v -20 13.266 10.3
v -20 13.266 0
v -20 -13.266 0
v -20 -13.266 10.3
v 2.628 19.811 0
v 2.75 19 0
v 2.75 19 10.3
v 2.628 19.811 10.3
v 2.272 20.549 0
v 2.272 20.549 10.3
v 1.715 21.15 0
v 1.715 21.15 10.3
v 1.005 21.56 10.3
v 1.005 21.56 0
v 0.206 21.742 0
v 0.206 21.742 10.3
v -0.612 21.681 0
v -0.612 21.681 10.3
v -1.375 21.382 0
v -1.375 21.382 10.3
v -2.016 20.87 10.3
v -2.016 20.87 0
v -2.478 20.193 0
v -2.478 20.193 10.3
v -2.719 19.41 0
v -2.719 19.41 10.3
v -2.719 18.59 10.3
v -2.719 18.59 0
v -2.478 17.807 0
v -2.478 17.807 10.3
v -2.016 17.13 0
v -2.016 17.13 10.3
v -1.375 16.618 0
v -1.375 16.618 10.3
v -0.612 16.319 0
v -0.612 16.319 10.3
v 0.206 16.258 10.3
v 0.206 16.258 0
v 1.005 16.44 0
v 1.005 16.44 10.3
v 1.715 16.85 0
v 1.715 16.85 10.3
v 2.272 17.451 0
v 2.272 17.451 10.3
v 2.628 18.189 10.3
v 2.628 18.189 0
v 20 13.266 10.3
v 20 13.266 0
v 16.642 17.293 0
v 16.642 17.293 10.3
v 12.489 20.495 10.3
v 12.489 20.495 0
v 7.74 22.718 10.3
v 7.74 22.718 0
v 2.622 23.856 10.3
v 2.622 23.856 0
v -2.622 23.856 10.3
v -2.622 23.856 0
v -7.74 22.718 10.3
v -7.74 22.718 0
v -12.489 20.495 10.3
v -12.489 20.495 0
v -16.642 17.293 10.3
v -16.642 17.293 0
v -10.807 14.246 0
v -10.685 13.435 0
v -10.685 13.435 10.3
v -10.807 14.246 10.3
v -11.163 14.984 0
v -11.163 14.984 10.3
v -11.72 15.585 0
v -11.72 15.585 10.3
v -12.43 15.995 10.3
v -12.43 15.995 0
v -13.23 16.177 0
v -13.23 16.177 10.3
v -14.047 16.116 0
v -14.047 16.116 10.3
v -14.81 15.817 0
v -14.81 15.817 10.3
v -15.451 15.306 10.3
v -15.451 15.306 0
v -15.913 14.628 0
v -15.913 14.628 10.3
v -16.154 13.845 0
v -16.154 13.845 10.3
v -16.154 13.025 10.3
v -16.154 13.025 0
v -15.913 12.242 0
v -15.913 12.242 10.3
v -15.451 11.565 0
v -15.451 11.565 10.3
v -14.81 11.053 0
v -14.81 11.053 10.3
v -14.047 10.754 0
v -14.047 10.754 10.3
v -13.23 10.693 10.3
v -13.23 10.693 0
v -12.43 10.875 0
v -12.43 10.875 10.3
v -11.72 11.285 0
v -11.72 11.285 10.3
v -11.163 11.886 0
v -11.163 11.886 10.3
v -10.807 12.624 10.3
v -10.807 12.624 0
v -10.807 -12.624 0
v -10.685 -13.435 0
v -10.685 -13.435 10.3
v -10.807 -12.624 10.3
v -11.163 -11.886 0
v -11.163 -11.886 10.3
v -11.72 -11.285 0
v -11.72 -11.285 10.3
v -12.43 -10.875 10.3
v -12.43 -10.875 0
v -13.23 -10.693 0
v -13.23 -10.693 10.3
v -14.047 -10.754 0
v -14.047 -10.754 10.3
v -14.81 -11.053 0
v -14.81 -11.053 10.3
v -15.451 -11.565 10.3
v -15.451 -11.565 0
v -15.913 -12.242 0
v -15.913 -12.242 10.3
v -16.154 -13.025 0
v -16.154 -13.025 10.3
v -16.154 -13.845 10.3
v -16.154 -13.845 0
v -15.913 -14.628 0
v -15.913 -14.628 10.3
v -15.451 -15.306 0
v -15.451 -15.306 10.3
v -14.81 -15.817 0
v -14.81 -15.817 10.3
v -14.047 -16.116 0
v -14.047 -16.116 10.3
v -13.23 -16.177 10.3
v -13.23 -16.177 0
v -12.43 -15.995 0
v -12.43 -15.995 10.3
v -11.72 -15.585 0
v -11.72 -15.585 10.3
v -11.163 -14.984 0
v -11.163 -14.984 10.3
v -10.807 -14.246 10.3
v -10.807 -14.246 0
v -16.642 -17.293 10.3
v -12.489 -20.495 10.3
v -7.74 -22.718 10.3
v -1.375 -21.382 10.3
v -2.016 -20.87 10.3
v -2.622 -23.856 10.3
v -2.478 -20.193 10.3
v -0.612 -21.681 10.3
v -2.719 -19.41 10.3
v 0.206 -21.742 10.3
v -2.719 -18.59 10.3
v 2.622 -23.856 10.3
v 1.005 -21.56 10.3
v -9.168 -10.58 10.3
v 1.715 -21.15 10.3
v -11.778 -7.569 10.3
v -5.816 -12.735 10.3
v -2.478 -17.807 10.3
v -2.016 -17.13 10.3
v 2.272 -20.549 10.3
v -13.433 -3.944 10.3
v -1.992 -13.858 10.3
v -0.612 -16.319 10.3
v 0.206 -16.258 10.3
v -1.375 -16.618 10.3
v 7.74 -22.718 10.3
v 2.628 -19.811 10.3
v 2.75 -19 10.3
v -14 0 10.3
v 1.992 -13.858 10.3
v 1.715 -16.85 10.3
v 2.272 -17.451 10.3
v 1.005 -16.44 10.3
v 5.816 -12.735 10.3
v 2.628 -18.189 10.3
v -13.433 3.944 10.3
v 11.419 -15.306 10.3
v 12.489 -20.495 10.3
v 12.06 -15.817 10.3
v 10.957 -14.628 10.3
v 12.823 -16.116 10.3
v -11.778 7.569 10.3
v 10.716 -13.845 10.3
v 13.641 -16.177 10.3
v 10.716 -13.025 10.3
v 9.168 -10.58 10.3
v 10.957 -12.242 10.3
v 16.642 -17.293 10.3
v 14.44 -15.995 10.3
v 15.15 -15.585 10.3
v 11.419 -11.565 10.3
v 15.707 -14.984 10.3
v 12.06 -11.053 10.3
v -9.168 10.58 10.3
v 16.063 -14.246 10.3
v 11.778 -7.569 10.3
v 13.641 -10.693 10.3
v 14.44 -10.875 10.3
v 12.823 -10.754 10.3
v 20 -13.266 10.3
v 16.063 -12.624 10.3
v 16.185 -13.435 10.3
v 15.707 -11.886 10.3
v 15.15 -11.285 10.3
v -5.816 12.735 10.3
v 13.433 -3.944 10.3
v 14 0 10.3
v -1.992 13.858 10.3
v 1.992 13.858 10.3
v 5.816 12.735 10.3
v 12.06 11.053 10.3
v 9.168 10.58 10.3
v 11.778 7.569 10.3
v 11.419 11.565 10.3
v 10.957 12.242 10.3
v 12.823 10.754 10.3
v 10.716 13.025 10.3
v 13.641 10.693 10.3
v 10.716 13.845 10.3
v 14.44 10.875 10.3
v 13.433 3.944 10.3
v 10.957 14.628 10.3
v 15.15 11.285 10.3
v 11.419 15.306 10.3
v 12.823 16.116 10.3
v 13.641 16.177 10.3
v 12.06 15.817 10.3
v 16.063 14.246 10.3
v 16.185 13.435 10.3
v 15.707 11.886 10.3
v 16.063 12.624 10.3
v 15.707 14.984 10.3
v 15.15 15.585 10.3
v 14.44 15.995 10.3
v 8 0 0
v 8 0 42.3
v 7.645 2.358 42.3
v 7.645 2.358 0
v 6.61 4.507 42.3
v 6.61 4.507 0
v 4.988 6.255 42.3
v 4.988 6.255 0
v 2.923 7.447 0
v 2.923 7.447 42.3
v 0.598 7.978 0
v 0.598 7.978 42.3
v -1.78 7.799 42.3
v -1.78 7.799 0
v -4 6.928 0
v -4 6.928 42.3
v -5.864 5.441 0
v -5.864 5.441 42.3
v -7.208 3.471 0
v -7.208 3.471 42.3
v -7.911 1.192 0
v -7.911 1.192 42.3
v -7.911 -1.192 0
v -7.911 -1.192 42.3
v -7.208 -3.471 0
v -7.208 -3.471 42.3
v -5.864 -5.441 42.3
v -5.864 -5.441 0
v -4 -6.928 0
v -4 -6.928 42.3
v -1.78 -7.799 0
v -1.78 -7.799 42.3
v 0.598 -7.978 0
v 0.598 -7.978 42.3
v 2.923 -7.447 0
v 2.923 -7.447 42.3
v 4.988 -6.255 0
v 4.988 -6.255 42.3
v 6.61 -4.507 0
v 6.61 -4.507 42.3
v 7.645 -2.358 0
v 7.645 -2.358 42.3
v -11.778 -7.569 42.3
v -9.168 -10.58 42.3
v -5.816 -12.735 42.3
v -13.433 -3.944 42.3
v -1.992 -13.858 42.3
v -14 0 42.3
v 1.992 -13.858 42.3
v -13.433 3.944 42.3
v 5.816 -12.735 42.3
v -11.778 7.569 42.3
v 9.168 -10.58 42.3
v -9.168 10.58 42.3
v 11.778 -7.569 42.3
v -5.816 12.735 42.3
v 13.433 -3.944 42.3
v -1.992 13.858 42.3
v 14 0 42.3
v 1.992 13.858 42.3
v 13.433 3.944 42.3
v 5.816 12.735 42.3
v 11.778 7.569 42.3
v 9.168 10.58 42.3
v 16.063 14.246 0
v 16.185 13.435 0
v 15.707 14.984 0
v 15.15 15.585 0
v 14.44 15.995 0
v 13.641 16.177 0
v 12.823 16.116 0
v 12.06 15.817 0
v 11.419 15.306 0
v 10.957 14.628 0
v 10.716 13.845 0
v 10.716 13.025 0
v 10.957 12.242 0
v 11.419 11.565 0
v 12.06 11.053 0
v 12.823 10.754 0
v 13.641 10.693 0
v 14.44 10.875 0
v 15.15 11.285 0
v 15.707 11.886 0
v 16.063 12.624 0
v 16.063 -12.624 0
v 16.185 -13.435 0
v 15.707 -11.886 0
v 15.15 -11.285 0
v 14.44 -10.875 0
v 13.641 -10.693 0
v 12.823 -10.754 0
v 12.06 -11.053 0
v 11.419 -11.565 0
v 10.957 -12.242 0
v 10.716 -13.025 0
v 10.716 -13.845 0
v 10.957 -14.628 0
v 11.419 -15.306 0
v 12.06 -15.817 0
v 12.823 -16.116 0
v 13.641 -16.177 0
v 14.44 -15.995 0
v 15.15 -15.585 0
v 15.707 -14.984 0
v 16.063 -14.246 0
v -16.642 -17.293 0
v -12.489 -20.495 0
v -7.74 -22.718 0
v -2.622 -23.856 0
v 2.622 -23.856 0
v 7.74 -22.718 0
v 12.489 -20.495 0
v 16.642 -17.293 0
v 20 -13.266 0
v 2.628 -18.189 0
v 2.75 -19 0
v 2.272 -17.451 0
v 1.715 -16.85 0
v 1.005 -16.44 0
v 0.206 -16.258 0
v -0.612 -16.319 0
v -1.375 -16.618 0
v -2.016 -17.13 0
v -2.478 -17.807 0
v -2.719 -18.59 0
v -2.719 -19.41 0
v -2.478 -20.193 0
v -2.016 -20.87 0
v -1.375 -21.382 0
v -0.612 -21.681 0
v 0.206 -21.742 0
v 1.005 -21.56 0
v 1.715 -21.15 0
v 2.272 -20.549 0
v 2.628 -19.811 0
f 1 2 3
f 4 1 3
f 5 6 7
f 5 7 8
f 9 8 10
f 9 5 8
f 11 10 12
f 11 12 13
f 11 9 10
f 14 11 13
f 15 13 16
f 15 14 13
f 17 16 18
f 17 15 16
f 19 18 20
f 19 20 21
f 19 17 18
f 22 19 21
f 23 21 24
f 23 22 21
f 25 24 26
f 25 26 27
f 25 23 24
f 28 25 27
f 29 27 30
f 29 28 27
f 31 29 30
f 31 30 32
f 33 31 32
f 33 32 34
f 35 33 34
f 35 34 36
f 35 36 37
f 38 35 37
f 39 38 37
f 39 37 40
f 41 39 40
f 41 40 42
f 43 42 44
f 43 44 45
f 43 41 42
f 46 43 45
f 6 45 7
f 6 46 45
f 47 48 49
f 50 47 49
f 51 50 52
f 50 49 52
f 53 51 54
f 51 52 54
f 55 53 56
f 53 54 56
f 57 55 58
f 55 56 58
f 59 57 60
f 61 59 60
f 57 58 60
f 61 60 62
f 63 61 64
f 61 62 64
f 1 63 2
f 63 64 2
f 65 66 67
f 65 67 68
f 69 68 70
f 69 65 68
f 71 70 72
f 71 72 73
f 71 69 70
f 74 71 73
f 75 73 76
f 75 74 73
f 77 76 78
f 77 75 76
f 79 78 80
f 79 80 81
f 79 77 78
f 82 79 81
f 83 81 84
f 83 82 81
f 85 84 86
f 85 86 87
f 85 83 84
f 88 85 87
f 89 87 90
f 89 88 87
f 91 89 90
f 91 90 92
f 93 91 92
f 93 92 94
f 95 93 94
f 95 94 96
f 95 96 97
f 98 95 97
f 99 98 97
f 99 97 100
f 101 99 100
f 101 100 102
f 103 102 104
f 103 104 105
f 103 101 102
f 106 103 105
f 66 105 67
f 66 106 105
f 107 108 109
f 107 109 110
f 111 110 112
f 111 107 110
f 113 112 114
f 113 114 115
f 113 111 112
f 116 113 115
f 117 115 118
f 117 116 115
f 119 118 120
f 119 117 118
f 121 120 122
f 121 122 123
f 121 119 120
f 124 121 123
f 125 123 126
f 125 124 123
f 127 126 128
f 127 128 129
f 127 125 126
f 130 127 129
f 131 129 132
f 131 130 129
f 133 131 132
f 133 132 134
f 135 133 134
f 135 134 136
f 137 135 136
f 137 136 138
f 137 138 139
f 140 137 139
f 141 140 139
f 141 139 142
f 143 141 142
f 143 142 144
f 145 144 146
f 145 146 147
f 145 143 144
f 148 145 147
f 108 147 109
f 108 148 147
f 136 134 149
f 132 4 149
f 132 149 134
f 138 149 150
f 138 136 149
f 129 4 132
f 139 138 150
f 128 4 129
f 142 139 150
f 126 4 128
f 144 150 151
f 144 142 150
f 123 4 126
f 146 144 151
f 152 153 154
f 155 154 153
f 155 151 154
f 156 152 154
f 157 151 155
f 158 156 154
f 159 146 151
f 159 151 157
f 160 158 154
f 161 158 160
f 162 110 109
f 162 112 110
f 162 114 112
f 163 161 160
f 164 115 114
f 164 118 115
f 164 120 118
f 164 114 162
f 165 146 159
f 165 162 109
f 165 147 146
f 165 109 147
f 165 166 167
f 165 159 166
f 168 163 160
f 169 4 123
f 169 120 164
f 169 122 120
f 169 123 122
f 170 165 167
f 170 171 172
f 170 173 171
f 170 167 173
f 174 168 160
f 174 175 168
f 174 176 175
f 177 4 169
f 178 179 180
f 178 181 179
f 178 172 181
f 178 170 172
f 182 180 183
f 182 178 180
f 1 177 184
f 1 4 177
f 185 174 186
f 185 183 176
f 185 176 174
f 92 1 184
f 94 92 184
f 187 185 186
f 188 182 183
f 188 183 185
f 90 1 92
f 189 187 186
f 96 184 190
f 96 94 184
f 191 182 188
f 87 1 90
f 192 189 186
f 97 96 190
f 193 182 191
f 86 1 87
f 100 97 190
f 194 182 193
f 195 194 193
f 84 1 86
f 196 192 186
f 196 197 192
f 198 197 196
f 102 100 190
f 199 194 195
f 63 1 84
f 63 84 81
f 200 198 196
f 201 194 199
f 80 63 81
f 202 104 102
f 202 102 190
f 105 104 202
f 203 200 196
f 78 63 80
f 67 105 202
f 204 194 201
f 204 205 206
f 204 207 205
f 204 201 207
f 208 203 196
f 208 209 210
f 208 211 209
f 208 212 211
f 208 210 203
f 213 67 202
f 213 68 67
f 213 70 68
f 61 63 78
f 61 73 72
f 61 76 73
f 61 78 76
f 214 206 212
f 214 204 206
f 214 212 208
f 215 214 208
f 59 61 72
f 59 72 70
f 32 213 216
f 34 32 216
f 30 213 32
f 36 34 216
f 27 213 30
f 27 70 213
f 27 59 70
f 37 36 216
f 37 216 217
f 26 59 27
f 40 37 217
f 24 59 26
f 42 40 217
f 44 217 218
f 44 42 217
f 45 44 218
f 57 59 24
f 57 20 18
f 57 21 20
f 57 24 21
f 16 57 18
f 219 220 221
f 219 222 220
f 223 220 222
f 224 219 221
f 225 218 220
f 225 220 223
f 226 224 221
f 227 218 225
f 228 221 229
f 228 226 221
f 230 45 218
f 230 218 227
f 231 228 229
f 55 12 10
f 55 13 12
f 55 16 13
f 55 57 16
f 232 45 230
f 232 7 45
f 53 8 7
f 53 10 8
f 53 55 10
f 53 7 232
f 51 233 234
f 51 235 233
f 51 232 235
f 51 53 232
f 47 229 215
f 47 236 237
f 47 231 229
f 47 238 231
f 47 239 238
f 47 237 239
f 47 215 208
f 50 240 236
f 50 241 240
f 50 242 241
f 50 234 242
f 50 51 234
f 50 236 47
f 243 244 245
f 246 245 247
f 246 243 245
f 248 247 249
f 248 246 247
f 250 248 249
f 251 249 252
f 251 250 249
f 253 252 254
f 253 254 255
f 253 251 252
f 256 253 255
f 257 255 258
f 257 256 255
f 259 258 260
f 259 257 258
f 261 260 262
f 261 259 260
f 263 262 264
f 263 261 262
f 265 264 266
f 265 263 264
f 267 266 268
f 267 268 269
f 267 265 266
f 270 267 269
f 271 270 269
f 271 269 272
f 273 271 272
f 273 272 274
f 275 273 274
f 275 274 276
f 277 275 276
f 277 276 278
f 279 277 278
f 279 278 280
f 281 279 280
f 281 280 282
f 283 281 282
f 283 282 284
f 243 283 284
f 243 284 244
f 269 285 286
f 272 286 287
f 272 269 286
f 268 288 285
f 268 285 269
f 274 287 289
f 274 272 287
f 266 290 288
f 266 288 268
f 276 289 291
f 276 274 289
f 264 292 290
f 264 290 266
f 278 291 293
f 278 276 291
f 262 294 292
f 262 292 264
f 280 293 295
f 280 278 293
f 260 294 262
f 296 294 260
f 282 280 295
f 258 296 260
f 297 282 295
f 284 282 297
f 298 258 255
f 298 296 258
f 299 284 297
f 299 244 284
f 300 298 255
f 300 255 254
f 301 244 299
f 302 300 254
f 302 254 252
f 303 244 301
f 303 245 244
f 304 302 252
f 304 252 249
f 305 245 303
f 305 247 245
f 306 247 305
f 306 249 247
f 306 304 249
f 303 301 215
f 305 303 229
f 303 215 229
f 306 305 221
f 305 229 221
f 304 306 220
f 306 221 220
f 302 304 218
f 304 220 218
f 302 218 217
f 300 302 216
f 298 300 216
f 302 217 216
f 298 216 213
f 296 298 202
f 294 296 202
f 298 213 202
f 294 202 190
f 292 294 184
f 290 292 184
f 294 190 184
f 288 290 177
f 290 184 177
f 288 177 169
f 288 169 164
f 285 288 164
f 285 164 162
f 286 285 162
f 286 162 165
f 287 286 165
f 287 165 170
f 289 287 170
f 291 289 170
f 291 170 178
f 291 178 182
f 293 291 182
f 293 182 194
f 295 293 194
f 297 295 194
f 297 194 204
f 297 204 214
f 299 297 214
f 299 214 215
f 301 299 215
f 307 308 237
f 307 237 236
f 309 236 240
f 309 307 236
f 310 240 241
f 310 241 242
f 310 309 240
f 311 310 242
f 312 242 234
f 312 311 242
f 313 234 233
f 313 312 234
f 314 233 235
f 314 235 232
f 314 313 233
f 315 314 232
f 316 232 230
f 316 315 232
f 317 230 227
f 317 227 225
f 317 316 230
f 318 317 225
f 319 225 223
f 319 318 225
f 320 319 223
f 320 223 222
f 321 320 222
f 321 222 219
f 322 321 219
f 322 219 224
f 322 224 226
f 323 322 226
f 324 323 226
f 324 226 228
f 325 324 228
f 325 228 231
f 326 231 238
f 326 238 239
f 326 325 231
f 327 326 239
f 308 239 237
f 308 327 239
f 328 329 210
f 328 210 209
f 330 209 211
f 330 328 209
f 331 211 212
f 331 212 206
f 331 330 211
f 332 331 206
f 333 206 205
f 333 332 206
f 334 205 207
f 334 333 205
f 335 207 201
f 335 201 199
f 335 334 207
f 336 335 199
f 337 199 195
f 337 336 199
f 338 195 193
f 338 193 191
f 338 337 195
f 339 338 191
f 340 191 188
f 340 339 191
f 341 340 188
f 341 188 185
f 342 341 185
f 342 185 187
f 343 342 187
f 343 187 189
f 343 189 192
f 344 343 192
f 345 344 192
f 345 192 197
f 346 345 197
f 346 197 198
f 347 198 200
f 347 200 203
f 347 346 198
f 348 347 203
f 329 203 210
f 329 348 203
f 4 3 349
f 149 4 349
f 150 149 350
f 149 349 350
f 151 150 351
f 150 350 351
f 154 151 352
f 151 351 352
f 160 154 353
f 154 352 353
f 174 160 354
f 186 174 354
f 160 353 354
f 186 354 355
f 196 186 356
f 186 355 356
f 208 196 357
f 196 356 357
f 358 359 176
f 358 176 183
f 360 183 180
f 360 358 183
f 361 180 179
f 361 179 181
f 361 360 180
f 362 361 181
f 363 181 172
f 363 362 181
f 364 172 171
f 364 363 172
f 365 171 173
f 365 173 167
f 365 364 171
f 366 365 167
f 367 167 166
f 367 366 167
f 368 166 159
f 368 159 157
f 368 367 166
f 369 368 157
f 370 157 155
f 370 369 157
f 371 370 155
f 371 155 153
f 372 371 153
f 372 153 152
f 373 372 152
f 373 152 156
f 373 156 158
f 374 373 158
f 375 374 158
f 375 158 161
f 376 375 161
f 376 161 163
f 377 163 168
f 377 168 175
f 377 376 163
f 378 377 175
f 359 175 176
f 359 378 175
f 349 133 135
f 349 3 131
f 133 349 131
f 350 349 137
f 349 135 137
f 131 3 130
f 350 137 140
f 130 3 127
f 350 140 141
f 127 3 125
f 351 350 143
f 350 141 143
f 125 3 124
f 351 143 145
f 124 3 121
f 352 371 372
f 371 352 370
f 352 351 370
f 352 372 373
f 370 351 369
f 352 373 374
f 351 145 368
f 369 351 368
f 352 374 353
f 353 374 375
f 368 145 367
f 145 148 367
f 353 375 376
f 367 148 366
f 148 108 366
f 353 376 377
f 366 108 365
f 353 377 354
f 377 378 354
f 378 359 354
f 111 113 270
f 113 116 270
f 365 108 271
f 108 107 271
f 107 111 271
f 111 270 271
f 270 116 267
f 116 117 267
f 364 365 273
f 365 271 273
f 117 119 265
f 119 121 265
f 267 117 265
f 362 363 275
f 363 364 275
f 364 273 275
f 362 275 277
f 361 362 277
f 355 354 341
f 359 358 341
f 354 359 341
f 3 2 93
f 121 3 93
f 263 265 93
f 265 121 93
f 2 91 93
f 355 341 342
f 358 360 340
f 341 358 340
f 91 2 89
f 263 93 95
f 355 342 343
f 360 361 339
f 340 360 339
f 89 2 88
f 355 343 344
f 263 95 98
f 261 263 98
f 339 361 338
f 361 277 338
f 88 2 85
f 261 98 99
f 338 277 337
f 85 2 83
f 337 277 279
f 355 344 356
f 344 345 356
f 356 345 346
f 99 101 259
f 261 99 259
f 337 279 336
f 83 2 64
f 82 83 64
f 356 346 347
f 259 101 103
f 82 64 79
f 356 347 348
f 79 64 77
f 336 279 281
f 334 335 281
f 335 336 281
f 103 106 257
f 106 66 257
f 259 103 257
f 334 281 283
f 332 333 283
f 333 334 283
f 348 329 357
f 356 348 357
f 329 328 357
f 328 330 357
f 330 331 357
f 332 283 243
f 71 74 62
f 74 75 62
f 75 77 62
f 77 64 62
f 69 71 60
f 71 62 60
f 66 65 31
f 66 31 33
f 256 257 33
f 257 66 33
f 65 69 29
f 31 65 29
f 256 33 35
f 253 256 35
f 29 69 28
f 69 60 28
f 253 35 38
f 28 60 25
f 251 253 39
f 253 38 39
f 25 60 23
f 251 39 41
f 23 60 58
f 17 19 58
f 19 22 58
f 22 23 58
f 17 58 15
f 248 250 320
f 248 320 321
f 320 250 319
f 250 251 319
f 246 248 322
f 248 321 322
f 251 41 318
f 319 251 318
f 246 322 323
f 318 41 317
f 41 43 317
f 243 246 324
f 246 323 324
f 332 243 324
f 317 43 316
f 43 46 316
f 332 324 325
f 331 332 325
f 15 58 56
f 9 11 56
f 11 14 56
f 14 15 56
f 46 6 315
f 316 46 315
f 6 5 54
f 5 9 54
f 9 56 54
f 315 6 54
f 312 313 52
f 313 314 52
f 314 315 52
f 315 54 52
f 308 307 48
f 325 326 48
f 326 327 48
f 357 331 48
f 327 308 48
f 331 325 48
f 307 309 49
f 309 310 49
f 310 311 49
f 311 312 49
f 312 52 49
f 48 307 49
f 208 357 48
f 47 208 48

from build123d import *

# Parameters (mm, degrees)
F0_R     = 2.75
F0_R_2   = 14
F0_R_3   = 8
F1_DEPTH = 10.3
F2_DEPTH = 42.3


with BuildPart() as f1:
    # F0 (on Top) → F1 (new body)
    with BuildSketch(Plane.XY):
        with BuildLine():
            Line((-20, 13.266499), (-20, -13.266499))
            ThreePointArc((-20, -13.266499), (0, -24), (20, -13.266499))
            Line((20, -13.266499), (20, 13.266499))
            ThreePointArc((20, 13.266499), (0, 24), (-20, 13.266499))
        make_face()
        with Locations((-13.435029, -13.435029)):
            Circle(F0_R, mode=Mode.SUBTRACT)
        with Locations((0, -19)):
            Circle(F0_R, mode=Mode.SUBTRACT)
        with Locations((13.435029, -13.435029)):
            Circle(F0_R, mode=Mode.SUBTRACT)
        with Locations((-13.435029, 13.435029)):
            Circle(F0_R, mode=Mode.SUBTRACT)
        Circle(F0_R_2, mode=Mode.SUBTRACT)
        with Locations((0, 19)):
            Circle(F0_R, mode=Mode.SUBTRACT)
        with Locations((13.435029, 13.435029)):
            Circle(F0_R, mode=Mode.SUBTRACT)
        Circle(F0_R_2)
        Circle(F0_R_3, mode=Mode.SUBTRACT)
    extrude(amount=F1_DEPTH)

    # F0 (on Top) → F2 (join)
    with BuildSketch(Plane.XY):
        Circle(F0_R_2)
        Circle(F0_R_3, mode=Mode.SUBTRACT)
    extrude(amount=F2_DEPTH)


solid = f1.part
